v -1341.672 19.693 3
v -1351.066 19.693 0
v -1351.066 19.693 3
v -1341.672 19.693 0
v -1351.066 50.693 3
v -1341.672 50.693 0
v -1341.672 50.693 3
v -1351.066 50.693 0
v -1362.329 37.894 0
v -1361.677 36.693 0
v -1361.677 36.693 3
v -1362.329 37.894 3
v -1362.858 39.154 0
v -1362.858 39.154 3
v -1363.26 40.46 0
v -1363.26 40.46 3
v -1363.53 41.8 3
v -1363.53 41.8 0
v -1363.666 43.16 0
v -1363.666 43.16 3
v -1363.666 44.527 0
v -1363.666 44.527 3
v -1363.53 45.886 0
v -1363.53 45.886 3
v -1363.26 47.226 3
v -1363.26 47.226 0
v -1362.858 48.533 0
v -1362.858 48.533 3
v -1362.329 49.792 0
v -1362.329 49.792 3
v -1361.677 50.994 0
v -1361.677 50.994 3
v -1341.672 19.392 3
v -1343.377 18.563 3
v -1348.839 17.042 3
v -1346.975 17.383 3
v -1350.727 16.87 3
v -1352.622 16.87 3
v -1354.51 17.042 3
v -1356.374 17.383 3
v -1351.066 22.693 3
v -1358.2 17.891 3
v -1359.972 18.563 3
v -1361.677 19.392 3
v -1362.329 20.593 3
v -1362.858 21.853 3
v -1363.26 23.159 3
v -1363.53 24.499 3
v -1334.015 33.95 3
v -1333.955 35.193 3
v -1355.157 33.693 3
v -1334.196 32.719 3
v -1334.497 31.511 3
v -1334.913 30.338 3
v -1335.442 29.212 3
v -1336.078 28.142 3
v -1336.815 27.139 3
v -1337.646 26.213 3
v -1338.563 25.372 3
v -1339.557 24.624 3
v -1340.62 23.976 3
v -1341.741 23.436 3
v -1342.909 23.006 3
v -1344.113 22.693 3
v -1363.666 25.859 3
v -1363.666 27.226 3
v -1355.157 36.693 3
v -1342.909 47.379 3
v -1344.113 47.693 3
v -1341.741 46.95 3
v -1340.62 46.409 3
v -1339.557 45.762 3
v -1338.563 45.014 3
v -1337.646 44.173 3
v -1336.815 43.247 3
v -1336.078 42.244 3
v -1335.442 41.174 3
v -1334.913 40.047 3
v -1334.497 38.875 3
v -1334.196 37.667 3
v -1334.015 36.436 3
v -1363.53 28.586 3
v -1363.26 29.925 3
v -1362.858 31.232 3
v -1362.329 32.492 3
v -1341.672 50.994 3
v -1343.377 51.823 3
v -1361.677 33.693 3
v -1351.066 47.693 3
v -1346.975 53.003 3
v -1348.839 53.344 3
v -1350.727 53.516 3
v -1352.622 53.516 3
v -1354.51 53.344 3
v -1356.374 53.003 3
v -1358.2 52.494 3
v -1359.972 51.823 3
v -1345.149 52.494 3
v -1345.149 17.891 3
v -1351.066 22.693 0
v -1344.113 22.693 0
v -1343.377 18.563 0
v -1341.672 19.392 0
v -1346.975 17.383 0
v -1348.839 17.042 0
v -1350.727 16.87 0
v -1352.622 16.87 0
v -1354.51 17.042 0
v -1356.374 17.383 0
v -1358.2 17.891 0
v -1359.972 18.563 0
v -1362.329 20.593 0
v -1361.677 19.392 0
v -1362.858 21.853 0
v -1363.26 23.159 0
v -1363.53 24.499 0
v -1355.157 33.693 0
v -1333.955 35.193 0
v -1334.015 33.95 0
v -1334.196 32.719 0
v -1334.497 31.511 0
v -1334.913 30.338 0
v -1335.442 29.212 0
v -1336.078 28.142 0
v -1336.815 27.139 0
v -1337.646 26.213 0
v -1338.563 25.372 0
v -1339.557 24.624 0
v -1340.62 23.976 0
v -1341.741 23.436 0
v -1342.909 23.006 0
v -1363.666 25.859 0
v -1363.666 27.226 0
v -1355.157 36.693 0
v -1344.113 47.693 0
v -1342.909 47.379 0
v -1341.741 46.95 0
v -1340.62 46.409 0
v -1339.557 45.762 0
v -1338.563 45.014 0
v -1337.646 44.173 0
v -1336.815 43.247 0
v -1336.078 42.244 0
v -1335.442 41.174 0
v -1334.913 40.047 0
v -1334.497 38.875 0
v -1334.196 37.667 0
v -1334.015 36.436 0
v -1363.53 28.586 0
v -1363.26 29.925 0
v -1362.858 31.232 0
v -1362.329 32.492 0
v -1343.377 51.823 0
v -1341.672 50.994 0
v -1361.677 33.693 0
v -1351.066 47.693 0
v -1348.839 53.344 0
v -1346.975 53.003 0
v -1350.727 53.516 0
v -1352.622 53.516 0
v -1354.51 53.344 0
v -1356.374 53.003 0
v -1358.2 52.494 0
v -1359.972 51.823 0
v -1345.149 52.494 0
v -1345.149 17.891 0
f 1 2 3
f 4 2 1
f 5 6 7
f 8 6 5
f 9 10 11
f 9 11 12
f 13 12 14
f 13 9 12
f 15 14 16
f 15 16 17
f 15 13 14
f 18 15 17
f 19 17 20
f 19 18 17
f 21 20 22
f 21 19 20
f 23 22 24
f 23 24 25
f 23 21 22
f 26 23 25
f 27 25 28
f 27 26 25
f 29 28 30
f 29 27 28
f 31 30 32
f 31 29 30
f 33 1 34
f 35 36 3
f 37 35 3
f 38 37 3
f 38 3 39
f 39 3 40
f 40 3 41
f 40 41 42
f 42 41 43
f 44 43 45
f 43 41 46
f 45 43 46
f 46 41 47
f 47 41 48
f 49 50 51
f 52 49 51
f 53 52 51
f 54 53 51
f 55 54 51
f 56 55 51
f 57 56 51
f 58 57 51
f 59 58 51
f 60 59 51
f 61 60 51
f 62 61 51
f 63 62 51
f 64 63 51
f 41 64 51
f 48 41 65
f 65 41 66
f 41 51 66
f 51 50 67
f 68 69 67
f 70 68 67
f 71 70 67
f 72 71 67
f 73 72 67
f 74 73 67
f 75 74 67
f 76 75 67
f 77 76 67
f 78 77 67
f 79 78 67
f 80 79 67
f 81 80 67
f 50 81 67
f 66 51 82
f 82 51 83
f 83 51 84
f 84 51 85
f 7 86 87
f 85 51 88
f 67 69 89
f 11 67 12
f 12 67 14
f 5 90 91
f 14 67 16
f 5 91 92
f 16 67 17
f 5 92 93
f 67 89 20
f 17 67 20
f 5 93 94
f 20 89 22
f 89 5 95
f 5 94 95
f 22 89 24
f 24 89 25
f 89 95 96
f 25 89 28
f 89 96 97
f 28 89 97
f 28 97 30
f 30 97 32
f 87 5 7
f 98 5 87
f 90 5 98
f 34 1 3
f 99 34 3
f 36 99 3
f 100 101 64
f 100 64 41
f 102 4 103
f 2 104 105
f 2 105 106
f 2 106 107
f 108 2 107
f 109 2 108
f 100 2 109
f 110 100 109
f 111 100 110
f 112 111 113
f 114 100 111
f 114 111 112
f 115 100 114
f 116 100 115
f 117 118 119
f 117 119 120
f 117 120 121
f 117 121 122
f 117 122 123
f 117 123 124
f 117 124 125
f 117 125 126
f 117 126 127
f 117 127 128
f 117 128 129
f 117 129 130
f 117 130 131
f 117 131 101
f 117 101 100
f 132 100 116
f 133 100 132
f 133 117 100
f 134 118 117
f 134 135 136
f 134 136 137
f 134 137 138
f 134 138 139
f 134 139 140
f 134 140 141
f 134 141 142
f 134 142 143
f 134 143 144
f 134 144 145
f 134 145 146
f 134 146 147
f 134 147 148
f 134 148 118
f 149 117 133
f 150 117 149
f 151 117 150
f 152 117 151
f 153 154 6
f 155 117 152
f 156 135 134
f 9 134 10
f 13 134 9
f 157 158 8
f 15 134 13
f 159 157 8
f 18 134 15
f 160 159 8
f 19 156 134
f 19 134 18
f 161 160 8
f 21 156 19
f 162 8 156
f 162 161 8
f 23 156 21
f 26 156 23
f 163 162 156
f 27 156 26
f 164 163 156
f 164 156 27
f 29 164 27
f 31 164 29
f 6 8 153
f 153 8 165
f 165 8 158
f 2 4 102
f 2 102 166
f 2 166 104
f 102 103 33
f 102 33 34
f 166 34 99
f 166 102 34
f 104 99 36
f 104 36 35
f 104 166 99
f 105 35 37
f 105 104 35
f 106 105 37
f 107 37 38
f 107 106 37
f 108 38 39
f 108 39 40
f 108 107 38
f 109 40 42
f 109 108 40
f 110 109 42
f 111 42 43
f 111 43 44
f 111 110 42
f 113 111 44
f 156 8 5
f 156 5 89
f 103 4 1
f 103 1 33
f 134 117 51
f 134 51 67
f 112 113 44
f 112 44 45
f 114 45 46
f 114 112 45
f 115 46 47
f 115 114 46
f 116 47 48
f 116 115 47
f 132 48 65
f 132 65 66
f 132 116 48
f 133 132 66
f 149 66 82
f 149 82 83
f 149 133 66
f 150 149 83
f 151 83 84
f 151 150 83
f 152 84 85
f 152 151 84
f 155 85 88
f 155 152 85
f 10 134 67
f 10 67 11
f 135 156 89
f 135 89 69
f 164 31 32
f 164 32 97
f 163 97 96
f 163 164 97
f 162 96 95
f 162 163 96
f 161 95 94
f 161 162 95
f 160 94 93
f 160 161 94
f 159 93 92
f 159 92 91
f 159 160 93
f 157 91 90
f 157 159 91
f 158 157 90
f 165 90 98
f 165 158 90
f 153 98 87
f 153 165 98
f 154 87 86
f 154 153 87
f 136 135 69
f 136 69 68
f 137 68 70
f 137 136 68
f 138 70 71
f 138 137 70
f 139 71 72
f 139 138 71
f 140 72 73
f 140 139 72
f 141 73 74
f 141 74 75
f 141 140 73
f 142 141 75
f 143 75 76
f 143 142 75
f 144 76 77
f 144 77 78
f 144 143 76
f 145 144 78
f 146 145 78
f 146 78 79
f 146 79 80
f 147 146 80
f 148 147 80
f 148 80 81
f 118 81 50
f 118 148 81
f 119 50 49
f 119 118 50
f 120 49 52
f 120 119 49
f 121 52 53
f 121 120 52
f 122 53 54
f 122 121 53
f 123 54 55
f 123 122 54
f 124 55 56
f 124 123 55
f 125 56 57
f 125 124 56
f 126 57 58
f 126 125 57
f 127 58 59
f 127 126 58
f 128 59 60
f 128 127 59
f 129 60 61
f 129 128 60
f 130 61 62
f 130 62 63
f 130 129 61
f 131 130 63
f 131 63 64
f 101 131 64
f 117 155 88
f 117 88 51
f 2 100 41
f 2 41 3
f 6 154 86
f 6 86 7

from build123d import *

# Parameters (mm, degrees)
BASE_EXTRUDE_DEPTH = 3


with BuildPart() as part:
    # Sketch1 → Base-Extrude (new body)
    with BuildSketch(Plane.XY):
        with BuildLine():
            Line((-1361.676742431, 33.692843094), (-1355.157111394, 33.692843094))
            Line((-1355.157111394, 33.692843094), (-1355.157111394, 36.692843094))
            Line((-1355.157111394, 36.692843094), (-1361.676742431, 36.692843094))
            ThreePointArc((-1361.676742431, 36.692843094), (-1363.682913665, 43.843214905), (-1361.676742431, 50.993586716))
            ThreePointArc((-1361.676742431, 50.993586716), (-1351.674443371, 53.537029915), (-1341.672144311, 50.993586716))
            Line((-1341.672144311, 50.993586716), (-1341.672144311, 50.692843094))
            Line((-1341.672144311, 50.692843094), (-1351.065792881, 50.692843094))
            Line((-1351.065792881, 50.692843094), (-1351.065792881, 47.692843094))
            Line((-1351.065792881, 47.692843094), (-1344.113445951, 47.692843094))
            ThreePointArc((-1344.113445951, 47.692843094), (-1333.95450385, 35.192843094), (-1344.113445951, 22.692843094))
            Line((-1344.113445951, 22.692843094), (-1351.065792881, 22.692843094))
            Line((-1351.065792881, 22.692843094), (-1351.065792881, 19.692843094))
            Line((-1351.065792881, 19.692843094), (-1341.672144311, 19.692843094))
            Line((-1341.672144311, 19.692843094), (-1341.672144311, 19.392099471))
            ThreePointArc((-1341.672144311, 19.392099471), (-1351.674443371, 16.848656272), (-1361.676742431, 19.392099471))
            ThreePointArc((-1361.676742431, 19.392099471), (-1363.682913665, 26.542471282), (-1361.676742431, 33.692843094))
        make_face()
    extrude(amount=BASE_EXTRUDE_DEPTH)


solid = part.part
